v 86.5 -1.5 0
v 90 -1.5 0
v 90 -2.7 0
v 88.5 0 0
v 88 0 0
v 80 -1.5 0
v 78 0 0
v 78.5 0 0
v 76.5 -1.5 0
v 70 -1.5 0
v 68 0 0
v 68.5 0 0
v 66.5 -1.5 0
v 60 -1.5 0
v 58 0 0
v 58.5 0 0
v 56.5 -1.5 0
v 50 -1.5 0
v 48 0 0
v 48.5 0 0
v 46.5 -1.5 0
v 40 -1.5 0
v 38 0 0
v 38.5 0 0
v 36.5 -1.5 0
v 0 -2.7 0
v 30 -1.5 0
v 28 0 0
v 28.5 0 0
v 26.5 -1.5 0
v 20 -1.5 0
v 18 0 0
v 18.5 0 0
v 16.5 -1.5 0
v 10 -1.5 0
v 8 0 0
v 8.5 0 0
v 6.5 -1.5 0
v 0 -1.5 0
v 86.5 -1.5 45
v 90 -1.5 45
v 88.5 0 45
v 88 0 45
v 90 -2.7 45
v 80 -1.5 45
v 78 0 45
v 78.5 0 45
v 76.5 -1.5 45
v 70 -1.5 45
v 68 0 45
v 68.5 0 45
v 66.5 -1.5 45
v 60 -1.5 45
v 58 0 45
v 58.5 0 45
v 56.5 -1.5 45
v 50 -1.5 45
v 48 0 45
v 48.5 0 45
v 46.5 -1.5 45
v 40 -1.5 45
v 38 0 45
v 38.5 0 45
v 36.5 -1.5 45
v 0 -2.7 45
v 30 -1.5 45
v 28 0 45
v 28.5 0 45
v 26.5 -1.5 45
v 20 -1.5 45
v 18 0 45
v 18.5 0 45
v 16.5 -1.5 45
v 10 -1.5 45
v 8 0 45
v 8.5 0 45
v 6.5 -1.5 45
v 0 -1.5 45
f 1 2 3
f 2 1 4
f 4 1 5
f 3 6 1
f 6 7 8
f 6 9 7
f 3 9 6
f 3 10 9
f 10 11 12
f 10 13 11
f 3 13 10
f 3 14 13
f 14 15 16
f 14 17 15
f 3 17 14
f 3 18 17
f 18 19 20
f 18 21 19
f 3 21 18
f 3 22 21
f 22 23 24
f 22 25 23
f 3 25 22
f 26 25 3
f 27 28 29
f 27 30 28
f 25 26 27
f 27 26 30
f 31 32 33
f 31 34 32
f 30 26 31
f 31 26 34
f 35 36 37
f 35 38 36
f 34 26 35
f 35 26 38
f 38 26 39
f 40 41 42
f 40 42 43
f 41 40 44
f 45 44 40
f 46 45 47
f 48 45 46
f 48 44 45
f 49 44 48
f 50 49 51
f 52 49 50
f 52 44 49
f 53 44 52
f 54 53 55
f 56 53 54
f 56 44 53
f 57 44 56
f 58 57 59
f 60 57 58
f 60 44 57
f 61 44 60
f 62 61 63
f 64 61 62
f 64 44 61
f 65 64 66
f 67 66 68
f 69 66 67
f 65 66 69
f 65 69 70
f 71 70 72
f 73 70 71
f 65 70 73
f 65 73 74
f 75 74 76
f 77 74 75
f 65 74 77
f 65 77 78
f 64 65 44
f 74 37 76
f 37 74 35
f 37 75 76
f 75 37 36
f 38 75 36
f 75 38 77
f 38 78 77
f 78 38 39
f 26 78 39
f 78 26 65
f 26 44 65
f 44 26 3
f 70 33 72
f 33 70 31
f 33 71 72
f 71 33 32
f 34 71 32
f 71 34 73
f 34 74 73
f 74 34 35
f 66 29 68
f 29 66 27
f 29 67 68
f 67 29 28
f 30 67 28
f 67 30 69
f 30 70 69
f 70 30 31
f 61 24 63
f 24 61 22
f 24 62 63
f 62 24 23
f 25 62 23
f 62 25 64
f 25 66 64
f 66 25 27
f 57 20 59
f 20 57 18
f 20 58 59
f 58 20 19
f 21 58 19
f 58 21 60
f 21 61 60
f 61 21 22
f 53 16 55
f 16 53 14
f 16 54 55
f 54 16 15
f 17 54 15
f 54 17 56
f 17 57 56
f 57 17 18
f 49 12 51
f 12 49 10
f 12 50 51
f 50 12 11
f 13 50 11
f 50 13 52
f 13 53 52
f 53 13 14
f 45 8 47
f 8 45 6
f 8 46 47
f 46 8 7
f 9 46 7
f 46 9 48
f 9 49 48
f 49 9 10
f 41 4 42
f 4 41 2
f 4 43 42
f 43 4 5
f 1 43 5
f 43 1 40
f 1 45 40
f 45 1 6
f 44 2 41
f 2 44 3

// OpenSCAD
/* containerwall.scad
 *
 * Copyright (C) Robert B. Ross, 2016
 *
 * This software is released under the Creative Commons
 * Attribution-ShareAlike 4.0 International Public License.
 */

containerWallFlat(bigFlat=6,littleFlat=0.5,thick=1.2);

/* simpleContainerWall() -- corrugated metal wall
 *
 * NOTE: Wall is positioned such that bottom left is at x=0,z=0, and back
 *       of wall is on y axis, but back left bottom corner is not at origin
 *       because of the shape of the wall.
 */
module simpleContainerWall(height = 45, length = 90) {
   containerWall(height=height, length=length, flat=3.0, ow=1.5, ot=1.5);
}

module containerWall(height = 45, length = 90, flat=3.0, ow=1.5, ot=1.5) {
   thickness = 0.8;
   reqFlatLen = flat; // requested flat length, possibly adjusted
   ptOffW = 1.0; // width
   ptOffT = 1.5; // thick

   origPanelLen = 2*(reqFlatLen + ptOffW);
   panelCount = floor(length/origPanelLen);

   /* tweak panel length to hit overall length target */
   diff = length - panelCount*origPanelLen;
   flatLen = reqFlatLen + diff / (panelCount*2); // two flatLens per panel
   newPanelLen = 2*(flatLen+ptOffW);

   for (i = [ 0 : panelCount - 1 ]) {
      translate([i * newPanelLen, -1*(ptOffT), 0])
         linear_extrude(height = height) {
            polygon(points = [[0,0],
                              [flatLen, 0],
                              [flatLen + ptOffW, ptOffT],
                              [2*flatLen + ptOffW, ptOffT],
                              [2*flatLen + 2*ptOffW, 0],
                              [2*flatLen + 2*ptOffW, ptOffT - thickness],
                              [2*flatLen + 2*ptOffW, -1* thickness],
                              [flatLen+2*ptOffW,-1* thickness],
                              [flatLen+ptOffW,-1*(ptOffT+thickness)],
                              [ptOffW,-1*(ptOffT+thickness)],
                              [0,-1*thickness]]);
        }
   }
}

/* containerWall2() -- asymmetric */
module containerWall2(height = 45, length = 90, bigFlat=4.0, littleFlat=1.0,
                      ow=1.5, ot=1.5)
{
   thickness = 0.8;
   reqFlatLen = bigFlat; // requested flat length, possibly adjusted
   ptOffW = ow; // width
   ptOffT = ot; // thick
   littleFlatLen = littleFlat;

   origPanelLen = reqFlatLen + 2*ptOffW + littleFlatLen;
   panelCount = floor(length/origPanelLen);

   /* tweak panel length to hit overall length target */
   diff = length - panelCount*origPanelLen;
   flatLen = reqFlatLen + diff / (panelCount); // two flatLens per panel
   newPanelLen = flatLen + 2*ptOffW + littleFlatLen;

   for (i = [ 0 : panelCount - 1 ]) {
      translate([i * newPanelLen, -1*(ptOffT), 0])
         linear_extrude(height = height) {
            polygon(points = [[0,0],
                              [flatLen, 0],
                              [flatLen + ptOffW, ptOffT],
                              [flatLen + ptOffW + littleFlatLen, ptOffT],
                              [flatLen + 2*ptOffW + littleFlatLen, 0],
                              [flatLen + 2*ptOffW + littleFlatLen, ptOffT - thickness],
                              [flatLen + 2*ptOffW + littleFlatLen, -1* thickness],
                              [flatLen+2*ptOffW,-1* thickness],
                              [flatLen+ptOffW,-1*(ptOffT+thickness)],
                              [ptOffW,-1*(ptOffT+thickness)],
                              [0,-1*thickness]]);
        }
   }
}

module containerWallFlat(height = 45, length = 90, bigFlat=4.0, littleFlat=1.0,
                      ow=1.5, ot=1.5,thick=0.8)
{
   thickness = thick;
   reqFlatLen = bigFlat; // requested flat length, possibly adjusted
   ptOffW = ow; // width
   ptOffT = ot; // thick
   littleFlatLen = littleFlat;

   origPanelLen = reqFlatLen + 2*ptOffW + littleFlatLen;
   panelCount = floor(length/origPanelLen);

   /* tweak panel length to hit overall length target */
   diff = length - panelCount*origPanelLen;
   flatLen = reqFlatLen + diff / (panelCount); // two flatLens per panel
   newPanelLen = flatLen + 2*ptOffW + littleFlatLen;

   for (i = [ 0 : panelCount - 1 ]) {
      translate([i * newPanelLen, -1*(ptOffT), 0])
         linear_extrude(height = height) {
            polygon(points = [[0,0],
                              [flatLen, 0],
                              [flatLen + ptOffW, ptOffT],
                              [flatLen + ptOffW + littleFlatLen, ptOffT],
                              [flatLen + 2*ptOffW + littleFlatLen, 0],
                              [flatLen + 2*ptOffW + littleFlatLen, ptOffT - thickness],
                              [flatLen + 2*ptOffW + littleFlatLen, -1* thickness],
                              [0,-1*thickness]]);
        }
   }
}
